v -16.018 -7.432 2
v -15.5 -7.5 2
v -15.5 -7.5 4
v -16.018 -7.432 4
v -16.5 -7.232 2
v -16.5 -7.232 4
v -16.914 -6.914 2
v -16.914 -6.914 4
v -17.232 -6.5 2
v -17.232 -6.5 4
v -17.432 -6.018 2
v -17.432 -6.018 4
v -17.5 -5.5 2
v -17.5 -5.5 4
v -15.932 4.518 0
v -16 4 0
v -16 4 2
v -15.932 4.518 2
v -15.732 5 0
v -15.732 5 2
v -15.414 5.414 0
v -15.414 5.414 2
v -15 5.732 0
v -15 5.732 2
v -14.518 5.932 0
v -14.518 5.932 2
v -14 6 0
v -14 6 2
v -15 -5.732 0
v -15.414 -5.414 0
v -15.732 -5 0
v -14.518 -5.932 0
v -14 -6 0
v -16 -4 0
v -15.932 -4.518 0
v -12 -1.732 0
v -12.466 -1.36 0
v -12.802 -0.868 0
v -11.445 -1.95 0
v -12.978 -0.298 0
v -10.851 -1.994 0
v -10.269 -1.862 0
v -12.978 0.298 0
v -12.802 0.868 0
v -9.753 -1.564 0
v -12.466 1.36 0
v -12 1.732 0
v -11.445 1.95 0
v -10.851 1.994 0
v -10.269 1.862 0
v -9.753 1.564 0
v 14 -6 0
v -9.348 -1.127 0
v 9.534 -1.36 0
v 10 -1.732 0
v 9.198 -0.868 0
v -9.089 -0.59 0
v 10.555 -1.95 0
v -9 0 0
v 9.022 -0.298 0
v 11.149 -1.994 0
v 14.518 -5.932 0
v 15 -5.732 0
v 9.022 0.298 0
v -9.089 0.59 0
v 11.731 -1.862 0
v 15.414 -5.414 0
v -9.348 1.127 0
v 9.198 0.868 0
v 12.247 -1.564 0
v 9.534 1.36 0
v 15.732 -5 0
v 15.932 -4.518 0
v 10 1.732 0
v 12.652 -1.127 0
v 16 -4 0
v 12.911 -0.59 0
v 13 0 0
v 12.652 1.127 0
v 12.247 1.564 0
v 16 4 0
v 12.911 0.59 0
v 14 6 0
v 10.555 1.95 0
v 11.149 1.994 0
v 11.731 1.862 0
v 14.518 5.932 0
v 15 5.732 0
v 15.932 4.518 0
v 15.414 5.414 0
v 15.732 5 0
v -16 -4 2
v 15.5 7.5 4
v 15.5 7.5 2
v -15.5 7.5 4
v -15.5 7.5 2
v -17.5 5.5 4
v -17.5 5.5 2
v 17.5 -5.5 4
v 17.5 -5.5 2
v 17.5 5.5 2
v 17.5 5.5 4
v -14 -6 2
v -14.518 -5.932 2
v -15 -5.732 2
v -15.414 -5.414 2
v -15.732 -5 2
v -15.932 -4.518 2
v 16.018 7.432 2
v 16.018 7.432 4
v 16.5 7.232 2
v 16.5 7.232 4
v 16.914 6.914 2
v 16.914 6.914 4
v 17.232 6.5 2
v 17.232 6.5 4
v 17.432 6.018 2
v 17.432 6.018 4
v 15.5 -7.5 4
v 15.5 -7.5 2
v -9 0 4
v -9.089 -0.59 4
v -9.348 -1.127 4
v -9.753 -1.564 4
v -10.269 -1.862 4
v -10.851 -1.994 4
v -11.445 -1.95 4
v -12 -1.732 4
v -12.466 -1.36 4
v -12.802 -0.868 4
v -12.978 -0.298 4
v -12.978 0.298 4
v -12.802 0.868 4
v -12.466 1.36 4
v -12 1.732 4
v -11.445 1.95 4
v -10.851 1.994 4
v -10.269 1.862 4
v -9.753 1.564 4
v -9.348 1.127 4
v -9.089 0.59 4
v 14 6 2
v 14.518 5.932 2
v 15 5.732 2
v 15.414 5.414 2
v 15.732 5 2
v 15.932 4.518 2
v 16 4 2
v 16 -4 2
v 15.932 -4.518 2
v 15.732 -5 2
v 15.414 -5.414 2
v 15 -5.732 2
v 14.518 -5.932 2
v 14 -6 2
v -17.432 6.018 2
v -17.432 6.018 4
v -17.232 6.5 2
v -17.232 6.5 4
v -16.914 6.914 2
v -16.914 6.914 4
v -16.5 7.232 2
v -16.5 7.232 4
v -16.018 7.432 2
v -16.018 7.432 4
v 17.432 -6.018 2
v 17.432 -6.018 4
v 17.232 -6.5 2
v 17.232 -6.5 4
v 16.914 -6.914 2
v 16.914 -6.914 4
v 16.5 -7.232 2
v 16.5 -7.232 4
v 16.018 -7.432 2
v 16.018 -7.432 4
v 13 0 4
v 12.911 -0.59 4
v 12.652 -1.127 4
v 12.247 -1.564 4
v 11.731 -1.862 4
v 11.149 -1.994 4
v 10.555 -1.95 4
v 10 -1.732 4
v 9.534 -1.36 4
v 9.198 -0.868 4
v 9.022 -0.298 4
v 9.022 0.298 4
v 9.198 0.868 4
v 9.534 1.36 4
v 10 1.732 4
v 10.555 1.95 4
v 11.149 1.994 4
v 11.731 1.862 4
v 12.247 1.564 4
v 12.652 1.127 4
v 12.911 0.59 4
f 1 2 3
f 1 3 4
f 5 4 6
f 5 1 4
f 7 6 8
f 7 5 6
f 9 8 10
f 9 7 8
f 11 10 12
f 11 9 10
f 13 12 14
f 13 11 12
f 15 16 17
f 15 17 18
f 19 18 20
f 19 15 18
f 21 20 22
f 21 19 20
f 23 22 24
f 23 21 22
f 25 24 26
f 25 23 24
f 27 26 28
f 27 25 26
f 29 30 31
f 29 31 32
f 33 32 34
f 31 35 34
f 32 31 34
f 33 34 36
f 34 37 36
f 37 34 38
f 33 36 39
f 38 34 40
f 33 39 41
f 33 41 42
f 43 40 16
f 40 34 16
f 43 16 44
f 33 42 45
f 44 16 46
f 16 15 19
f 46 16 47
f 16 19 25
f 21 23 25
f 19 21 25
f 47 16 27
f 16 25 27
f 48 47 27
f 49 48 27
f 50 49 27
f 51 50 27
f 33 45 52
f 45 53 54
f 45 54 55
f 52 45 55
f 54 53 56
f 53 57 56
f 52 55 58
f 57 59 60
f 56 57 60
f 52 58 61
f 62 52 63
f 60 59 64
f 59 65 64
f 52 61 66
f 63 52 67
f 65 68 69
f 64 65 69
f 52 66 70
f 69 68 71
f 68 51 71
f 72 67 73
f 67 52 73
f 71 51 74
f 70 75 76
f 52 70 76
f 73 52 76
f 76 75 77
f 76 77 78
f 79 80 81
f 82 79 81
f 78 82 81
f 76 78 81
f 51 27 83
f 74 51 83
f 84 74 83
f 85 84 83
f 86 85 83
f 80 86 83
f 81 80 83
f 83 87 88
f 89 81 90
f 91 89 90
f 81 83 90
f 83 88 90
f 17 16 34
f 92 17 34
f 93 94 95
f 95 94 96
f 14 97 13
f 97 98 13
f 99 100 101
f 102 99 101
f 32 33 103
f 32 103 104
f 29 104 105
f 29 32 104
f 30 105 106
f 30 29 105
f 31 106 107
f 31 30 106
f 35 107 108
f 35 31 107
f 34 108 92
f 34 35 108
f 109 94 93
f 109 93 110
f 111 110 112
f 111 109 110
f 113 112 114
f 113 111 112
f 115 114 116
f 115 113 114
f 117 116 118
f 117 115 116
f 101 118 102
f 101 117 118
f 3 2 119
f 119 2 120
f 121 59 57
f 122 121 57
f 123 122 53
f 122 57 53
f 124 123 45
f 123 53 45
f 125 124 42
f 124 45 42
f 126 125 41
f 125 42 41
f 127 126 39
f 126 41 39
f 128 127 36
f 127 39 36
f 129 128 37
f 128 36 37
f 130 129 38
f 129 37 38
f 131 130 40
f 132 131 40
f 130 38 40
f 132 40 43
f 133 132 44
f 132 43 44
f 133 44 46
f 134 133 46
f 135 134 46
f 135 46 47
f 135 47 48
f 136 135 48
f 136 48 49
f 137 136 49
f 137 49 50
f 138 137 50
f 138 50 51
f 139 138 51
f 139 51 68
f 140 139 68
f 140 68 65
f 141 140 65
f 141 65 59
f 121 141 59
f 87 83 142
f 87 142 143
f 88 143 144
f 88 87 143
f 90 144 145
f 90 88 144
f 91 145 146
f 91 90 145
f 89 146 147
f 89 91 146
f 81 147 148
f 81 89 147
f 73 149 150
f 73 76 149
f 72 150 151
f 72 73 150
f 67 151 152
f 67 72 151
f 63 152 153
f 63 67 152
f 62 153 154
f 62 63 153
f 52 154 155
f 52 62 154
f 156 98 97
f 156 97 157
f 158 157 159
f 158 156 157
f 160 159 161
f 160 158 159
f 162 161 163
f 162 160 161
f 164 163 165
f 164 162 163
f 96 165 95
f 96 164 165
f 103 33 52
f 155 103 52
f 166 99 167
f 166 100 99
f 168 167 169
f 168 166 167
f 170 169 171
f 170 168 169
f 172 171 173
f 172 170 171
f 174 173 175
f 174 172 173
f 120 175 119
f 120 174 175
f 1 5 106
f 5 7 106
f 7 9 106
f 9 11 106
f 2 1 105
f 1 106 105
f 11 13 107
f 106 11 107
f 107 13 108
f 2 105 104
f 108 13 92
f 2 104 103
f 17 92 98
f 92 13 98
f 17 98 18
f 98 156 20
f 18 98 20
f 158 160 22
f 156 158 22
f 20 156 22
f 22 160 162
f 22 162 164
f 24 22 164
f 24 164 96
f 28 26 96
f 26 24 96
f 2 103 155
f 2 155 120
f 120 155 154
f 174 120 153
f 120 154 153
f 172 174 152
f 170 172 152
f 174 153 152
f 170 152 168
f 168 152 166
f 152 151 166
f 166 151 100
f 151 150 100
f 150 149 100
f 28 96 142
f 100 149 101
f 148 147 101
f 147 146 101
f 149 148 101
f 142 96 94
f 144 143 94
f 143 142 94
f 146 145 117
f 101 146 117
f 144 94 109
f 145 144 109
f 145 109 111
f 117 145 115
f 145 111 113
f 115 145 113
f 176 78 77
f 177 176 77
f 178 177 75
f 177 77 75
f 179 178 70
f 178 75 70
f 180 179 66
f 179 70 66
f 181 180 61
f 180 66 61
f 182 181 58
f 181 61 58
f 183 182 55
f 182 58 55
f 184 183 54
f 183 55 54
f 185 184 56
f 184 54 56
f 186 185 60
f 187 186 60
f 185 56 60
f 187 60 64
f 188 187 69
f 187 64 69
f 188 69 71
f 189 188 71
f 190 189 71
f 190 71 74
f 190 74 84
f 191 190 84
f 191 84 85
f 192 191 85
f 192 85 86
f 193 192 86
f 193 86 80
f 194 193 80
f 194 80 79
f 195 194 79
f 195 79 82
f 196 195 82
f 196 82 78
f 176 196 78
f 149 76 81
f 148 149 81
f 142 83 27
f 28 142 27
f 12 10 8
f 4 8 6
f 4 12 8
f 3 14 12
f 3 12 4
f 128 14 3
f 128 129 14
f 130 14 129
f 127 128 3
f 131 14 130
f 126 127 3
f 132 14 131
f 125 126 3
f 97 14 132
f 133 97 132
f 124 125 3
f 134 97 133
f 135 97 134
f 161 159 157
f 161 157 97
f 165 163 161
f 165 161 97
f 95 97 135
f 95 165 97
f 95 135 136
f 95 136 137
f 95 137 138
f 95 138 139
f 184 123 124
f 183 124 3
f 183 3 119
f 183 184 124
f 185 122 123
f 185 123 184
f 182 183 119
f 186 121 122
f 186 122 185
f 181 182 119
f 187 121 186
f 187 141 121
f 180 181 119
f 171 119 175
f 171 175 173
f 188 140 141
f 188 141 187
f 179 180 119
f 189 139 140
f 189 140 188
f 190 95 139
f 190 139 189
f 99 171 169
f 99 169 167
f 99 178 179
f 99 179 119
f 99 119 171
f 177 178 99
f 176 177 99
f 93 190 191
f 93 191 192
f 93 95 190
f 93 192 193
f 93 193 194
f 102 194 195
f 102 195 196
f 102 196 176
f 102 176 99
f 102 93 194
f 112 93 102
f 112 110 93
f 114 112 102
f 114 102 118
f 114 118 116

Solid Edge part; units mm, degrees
sketch "Sketch1" plane through (0, 0, 0) normal (0, 0, 1) x (1, 0, 0)
  line L0 (-14, -6) -> (14, -6)
  arc A0 (14, -6) -> (16, -4) centre (14, -4) ccw
  line L1 (16, -4) -> (16, 4)
  arc A1 (16, 4) -> (14, 6) centre (14, 4) ccw
  line L2 (14, 6) -> (-14, 6)
  arc A2 (-14, 6) -> (-16, 4) centre (-14, 4) ccw
  line L3 (-16, 4) -> (-16, -4)
  arc A3 (-14, -6) -> (-16, -4) centre (-14, -4) cw
extrude "Protrusion1" add sketch "Sketch1" along normal blind 2
sketch "Sketch2" plane through (0, 0, 2) normal (0, 0, 1) x (1, 0, 0)
  line L0 (-15.5, -7.5) -> (15.5, -7.5)
  arc A0 (15.5, -7.5) -> (17.5, -5.5) centre (15.5, -5.5) ccw
  line L1 (17.5, -5.5) -> (17.5, 5.5)
  arc A1 (17.5, 5.5) -> (15.5, 7.5) centre (15.5, 5.5) ccw
  line L2 (15.5, 7.5) -> (-15.5, 7.5)
  arc A2 (-15.5, 7.5) -> (-17.5, 5.5) centre (-15.5, 5.5) ccw
  line L3 (-17.5, 5.5) -> (-17.5, -5.5)
  arc A3 (-15.5, -7.5) -> (-17.5, -5.5) centre (-15.5, -5.5) cw
extrude "ExtrudedProtrusion_2" add sketch "Sketch2" along normal blind 2
sketch "Sketch3" plane through (0, 0, 0) normal (0, 0, -1) x (1, 0, 0)
  circle A0 centre (-11, 0) radius 2
  circle A1 centre (11, 0) radius 2
  dimension "D1" = 5
  dimension "D2" = 5
extrude "ExtrudedCutout_1" cut sketch "Sketch3" against normal blind 7.258
